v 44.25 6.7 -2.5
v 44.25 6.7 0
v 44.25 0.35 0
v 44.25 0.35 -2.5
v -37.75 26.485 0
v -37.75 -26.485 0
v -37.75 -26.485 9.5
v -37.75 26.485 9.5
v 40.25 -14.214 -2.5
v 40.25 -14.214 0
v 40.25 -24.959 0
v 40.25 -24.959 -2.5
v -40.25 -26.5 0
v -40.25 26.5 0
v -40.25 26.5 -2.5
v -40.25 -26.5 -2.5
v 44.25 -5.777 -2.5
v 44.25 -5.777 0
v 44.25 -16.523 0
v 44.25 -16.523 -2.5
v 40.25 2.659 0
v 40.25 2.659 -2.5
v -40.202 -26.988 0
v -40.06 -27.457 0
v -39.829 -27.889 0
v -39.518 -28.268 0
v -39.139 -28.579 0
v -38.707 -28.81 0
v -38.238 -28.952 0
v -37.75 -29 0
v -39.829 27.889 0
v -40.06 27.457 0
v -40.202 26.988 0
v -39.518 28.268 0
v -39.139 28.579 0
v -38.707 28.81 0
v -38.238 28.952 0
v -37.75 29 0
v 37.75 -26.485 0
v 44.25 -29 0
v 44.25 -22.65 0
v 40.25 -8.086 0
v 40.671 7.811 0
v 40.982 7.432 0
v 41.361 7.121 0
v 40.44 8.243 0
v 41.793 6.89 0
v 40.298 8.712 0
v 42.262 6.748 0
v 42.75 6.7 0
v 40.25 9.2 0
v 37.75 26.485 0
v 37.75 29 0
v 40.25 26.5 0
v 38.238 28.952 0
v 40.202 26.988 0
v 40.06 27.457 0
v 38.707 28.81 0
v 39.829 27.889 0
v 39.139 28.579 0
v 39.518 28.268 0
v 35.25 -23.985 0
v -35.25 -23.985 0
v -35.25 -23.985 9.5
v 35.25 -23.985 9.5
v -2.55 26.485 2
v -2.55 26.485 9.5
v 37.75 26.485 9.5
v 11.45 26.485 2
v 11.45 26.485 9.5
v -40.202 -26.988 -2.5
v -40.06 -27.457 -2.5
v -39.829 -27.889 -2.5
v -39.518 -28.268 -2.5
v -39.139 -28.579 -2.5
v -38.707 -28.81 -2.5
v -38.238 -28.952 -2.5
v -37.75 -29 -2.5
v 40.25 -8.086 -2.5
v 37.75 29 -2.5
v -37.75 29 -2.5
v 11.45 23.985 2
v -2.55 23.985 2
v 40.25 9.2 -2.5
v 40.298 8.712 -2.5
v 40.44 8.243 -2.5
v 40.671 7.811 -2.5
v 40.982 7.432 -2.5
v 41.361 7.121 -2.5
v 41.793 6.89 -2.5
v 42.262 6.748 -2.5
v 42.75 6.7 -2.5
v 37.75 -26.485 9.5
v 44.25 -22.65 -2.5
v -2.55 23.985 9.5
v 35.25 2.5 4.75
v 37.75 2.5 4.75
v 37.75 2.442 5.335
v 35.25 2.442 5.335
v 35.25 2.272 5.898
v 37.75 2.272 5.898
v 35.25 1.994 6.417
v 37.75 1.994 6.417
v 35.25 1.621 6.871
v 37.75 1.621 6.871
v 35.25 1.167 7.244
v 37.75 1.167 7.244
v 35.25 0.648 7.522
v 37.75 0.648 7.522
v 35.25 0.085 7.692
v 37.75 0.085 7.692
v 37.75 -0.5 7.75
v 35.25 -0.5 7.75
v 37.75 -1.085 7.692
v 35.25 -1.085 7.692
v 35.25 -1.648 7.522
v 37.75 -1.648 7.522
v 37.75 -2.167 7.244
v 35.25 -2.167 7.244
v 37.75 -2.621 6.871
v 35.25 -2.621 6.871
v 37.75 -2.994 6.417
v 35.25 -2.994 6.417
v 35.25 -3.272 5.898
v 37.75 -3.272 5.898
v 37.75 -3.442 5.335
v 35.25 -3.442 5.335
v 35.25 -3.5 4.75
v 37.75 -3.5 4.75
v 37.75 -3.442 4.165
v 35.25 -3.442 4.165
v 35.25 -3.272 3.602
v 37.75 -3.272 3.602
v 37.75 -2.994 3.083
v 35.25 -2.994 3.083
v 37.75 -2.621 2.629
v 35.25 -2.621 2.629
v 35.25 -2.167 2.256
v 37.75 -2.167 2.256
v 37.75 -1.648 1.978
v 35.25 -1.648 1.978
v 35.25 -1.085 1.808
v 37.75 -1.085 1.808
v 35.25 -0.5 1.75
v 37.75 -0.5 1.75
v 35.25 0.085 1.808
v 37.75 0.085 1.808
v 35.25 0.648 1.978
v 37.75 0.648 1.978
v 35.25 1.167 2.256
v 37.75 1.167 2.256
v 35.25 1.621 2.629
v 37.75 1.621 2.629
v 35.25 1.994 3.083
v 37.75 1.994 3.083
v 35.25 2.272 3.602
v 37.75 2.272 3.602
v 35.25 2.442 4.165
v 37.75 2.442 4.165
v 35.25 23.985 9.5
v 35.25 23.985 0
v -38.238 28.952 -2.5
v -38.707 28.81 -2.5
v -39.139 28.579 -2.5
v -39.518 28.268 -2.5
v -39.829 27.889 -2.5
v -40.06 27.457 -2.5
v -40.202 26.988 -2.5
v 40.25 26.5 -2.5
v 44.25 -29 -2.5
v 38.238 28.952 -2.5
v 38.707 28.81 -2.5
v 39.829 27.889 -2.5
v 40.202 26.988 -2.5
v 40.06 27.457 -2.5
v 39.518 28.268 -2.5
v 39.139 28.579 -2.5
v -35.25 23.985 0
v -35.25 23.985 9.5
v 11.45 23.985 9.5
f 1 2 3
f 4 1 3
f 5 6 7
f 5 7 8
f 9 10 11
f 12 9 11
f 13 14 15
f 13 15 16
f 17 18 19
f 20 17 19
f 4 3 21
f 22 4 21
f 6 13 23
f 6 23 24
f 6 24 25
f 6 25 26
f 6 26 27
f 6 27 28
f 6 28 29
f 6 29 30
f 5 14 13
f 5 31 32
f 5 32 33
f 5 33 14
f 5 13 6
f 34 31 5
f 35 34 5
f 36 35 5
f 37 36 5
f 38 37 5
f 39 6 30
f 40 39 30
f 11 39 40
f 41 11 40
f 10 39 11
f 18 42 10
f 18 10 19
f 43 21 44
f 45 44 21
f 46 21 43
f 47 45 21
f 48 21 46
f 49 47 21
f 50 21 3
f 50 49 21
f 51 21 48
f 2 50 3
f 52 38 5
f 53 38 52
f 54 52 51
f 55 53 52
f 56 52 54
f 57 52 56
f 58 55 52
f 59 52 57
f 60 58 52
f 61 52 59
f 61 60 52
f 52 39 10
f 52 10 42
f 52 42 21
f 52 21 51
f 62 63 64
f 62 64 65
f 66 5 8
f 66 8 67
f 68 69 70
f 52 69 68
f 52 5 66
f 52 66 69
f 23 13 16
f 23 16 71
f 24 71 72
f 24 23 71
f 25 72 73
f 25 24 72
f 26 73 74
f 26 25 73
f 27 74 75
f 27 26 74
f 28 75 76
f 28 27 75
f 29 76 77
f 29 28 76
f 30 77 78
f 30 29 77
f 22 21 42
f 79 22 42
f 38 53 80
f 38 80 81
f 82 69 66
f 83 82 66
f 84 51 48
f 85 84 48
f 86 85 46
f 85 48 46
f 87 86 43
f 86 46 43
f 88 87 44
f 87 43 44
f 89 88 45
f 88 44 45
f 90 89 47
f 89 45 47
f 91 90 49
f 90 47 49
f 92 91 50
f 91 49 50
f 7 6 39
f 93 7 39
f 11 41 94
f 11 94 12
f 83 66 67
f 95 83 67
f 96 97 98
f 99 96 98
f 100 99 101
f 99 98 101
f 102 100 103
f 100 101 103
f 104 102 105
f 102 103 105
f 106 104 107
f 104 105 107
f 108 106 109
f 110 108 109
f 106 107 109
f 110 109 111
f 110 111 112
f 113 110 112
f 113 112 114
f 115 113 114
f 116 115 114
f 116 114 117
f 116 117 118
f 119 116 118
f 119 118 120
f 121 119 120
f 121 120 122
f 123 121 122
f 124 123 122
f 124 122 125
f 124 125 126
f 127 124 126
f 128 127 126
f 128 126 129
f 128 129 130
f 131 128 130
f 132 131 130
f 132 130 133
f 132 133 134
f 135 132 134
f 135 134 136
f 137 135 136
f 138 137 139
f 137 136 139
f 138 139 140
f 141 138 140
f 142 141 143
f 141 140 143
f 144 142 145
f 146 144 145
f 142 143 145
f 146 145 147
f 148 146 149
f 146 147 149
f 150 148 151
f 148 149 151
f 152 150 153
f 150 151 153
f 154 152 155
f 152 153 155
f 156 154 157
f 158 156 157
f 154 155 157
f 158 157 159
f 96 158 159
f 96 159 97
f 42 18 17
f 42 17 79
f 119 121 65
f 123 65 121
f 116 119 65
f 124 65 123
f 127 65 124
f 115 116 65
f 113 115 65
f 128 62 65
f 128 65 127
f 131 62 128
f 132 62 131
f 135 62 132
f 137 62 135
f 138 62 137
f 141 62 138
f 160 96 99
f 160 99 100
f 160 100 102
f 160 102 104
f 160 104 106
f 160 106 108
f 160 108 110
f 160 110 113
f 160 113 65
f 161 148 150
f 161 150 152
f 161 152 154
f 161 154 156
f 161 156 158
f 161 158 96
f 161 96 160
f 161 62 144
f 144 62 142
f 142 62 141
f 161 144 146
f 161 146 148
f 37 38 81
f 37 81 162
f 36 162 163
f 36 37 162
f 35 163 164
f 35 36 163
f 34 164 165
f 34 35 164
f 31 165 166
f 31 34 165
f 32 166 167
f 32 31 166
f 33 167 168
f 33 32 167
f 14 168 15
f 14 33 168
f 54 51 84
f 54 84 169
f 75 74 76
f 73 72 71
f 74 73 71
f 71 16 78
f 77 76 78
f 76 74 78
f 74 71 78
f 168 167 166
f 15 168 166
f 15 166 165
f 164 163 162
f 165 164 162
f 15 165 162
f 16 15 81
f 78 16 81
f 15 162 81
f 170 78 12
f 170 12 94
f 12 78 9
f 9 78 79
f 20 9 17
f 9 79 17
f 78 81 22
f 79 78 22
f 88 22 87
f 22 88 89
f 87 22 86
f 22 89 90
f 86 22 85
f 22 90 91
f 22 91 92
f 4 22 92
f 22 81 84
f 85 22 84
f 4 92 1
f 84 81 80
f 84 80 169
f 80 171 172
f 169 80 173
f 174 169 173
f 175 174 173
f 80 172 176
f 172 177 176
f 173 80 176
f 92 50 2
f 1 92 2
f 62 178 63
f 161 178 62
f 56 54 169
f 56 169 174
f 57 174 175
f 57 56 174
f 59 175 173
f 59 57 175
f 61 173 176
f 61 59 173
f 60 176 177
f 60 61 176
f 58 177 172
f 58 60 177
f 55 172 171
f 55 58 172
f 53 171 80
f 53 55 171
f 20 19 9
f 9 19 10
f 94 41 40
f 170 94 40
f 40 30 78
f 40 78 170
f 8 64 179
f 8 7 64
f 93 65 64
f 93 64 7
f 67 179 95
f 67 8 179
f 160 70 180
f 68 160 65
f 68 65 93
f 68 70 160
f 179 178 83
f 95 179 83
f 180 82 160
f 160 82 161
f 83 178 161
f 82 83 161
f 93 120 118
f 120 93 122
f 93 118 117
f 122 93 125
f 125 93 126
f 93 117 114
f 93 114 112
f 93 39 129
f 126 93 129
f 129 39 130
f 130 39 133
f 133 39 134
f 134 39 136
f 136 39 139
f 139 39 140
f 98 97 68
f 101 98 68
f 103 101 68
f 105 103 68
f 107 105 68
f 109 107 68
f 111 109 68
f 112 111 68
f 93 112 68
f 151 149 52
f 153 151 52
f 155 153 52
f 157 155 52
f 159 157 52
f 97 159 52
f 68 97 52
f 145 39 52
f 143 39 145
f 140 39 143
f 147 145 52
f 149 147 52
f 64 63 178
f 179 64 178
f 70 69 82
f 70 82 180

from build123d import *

# Parameters (mm, degrees)
SKETCH_W        = 70.5
SKETCH_H        = 47.97
PAD_DEPTH       = 9.5
THICKNESS_T     = 2.5
PAD001_DEPTH    = 2.5
SKETCH003_R     = 3
POCKET001_DEPTH = 5
SKETCH002_W     = 14
SKETCH002_H     = 7.5
POCKET_DEPTH    = 2.5


with BuildPart() as part:
    # Sketch → Pad (new body)
    with BuildSketch(Plane.XY):
        Rectangle(SKETCH_W, SKETCH_H)
    extrude(amount=PAD_DEPTH)

    # Thickness
    thickness_openings = [part.faces().sort_by_distance(p)[0] for p in [
        (0, 0, 9.5),
        (0, 0, 0),
    ]]
    offset(amount=THICKNESS_T, openings=thickness_openings, kind=Kind.INTERSECTION)

    # Sketch001 → Pad001 (join)
    with BuildSketch(Plane.XY):
        with BuildLine():
            Line((-40.25, 26.5), (-40.25, -26.5))
            ThreePointArc((-40.25, -26.5), (-39.517767, -28.267767), (-37.75, -29))
            Line((-37.75, -29), (40.25, -29))
            Line((40.25, -29), (44.25, -29))
            Line((44.25, -22.65), (44.25, -29))
            Line((44.25, -22.65), (40.25, -24.959401))
            Line((40.25, -14.213533), (40.25, -24.959401))
            Line((44.25, -16.522934), (40.25, -14.213533))
            Line((44.25, -5.777066), (44.25, -16.522934))
            Line((44.25, -5.777066), (40.25, -8.086467))
            Line((40.25, 2.659401), (40.25, -8.086467))
            Line((44.25, 0.35), (40.25, 2.659401))
            Line((44.25, 6.7), (44.25, 0.35))
            Line((42.75, 6.7), (44.25, 6.7))
            ThreePointArc((40.25, 9.2), (40.982233, 7.432233), (42.75, 6.7))
            Line((40.25, 9.2), (40.25, 26.5))
            ThreePointArc((40.25, 26.5), (39.517767, 28.267767), (37.75, 29))
            Line((37.75, 29), (-37.75, 29))
            ThreePointArc((-37.75, 29), (-39.517767, 28.267767), (-40.25, 26.5))
        make_face()
    extrude(amount=-PAD001_DEPTH)

    # Sketch003 (on Face10 of Pad001) → Pocket001 (cut)
    with BuildSketch(Plane.YZ.offset(37.75)):
        with Locations((-0.5, 4.75)):
            Circle(SKETCH003_R)
    extrude(amount=-POCKET001_DEPTH, mode=Mode.SUBTRACT)

    # Sketch002 (on Face7 of Pad001) → Pocket (cut)
    with BuildSketch(Plane(origin=(0, 26.485, 0), x_dir=(-1, 0, 0), z_dir=(0, 1, 0))):
        with Locations((-4.45, 5.75)):
            Rectangle(SKETCH002_W, SKETCH002_H)
    extrude(amount=-POCKET_DEPTH, mode=Mode.SUBTRACT)


solid = part.part
